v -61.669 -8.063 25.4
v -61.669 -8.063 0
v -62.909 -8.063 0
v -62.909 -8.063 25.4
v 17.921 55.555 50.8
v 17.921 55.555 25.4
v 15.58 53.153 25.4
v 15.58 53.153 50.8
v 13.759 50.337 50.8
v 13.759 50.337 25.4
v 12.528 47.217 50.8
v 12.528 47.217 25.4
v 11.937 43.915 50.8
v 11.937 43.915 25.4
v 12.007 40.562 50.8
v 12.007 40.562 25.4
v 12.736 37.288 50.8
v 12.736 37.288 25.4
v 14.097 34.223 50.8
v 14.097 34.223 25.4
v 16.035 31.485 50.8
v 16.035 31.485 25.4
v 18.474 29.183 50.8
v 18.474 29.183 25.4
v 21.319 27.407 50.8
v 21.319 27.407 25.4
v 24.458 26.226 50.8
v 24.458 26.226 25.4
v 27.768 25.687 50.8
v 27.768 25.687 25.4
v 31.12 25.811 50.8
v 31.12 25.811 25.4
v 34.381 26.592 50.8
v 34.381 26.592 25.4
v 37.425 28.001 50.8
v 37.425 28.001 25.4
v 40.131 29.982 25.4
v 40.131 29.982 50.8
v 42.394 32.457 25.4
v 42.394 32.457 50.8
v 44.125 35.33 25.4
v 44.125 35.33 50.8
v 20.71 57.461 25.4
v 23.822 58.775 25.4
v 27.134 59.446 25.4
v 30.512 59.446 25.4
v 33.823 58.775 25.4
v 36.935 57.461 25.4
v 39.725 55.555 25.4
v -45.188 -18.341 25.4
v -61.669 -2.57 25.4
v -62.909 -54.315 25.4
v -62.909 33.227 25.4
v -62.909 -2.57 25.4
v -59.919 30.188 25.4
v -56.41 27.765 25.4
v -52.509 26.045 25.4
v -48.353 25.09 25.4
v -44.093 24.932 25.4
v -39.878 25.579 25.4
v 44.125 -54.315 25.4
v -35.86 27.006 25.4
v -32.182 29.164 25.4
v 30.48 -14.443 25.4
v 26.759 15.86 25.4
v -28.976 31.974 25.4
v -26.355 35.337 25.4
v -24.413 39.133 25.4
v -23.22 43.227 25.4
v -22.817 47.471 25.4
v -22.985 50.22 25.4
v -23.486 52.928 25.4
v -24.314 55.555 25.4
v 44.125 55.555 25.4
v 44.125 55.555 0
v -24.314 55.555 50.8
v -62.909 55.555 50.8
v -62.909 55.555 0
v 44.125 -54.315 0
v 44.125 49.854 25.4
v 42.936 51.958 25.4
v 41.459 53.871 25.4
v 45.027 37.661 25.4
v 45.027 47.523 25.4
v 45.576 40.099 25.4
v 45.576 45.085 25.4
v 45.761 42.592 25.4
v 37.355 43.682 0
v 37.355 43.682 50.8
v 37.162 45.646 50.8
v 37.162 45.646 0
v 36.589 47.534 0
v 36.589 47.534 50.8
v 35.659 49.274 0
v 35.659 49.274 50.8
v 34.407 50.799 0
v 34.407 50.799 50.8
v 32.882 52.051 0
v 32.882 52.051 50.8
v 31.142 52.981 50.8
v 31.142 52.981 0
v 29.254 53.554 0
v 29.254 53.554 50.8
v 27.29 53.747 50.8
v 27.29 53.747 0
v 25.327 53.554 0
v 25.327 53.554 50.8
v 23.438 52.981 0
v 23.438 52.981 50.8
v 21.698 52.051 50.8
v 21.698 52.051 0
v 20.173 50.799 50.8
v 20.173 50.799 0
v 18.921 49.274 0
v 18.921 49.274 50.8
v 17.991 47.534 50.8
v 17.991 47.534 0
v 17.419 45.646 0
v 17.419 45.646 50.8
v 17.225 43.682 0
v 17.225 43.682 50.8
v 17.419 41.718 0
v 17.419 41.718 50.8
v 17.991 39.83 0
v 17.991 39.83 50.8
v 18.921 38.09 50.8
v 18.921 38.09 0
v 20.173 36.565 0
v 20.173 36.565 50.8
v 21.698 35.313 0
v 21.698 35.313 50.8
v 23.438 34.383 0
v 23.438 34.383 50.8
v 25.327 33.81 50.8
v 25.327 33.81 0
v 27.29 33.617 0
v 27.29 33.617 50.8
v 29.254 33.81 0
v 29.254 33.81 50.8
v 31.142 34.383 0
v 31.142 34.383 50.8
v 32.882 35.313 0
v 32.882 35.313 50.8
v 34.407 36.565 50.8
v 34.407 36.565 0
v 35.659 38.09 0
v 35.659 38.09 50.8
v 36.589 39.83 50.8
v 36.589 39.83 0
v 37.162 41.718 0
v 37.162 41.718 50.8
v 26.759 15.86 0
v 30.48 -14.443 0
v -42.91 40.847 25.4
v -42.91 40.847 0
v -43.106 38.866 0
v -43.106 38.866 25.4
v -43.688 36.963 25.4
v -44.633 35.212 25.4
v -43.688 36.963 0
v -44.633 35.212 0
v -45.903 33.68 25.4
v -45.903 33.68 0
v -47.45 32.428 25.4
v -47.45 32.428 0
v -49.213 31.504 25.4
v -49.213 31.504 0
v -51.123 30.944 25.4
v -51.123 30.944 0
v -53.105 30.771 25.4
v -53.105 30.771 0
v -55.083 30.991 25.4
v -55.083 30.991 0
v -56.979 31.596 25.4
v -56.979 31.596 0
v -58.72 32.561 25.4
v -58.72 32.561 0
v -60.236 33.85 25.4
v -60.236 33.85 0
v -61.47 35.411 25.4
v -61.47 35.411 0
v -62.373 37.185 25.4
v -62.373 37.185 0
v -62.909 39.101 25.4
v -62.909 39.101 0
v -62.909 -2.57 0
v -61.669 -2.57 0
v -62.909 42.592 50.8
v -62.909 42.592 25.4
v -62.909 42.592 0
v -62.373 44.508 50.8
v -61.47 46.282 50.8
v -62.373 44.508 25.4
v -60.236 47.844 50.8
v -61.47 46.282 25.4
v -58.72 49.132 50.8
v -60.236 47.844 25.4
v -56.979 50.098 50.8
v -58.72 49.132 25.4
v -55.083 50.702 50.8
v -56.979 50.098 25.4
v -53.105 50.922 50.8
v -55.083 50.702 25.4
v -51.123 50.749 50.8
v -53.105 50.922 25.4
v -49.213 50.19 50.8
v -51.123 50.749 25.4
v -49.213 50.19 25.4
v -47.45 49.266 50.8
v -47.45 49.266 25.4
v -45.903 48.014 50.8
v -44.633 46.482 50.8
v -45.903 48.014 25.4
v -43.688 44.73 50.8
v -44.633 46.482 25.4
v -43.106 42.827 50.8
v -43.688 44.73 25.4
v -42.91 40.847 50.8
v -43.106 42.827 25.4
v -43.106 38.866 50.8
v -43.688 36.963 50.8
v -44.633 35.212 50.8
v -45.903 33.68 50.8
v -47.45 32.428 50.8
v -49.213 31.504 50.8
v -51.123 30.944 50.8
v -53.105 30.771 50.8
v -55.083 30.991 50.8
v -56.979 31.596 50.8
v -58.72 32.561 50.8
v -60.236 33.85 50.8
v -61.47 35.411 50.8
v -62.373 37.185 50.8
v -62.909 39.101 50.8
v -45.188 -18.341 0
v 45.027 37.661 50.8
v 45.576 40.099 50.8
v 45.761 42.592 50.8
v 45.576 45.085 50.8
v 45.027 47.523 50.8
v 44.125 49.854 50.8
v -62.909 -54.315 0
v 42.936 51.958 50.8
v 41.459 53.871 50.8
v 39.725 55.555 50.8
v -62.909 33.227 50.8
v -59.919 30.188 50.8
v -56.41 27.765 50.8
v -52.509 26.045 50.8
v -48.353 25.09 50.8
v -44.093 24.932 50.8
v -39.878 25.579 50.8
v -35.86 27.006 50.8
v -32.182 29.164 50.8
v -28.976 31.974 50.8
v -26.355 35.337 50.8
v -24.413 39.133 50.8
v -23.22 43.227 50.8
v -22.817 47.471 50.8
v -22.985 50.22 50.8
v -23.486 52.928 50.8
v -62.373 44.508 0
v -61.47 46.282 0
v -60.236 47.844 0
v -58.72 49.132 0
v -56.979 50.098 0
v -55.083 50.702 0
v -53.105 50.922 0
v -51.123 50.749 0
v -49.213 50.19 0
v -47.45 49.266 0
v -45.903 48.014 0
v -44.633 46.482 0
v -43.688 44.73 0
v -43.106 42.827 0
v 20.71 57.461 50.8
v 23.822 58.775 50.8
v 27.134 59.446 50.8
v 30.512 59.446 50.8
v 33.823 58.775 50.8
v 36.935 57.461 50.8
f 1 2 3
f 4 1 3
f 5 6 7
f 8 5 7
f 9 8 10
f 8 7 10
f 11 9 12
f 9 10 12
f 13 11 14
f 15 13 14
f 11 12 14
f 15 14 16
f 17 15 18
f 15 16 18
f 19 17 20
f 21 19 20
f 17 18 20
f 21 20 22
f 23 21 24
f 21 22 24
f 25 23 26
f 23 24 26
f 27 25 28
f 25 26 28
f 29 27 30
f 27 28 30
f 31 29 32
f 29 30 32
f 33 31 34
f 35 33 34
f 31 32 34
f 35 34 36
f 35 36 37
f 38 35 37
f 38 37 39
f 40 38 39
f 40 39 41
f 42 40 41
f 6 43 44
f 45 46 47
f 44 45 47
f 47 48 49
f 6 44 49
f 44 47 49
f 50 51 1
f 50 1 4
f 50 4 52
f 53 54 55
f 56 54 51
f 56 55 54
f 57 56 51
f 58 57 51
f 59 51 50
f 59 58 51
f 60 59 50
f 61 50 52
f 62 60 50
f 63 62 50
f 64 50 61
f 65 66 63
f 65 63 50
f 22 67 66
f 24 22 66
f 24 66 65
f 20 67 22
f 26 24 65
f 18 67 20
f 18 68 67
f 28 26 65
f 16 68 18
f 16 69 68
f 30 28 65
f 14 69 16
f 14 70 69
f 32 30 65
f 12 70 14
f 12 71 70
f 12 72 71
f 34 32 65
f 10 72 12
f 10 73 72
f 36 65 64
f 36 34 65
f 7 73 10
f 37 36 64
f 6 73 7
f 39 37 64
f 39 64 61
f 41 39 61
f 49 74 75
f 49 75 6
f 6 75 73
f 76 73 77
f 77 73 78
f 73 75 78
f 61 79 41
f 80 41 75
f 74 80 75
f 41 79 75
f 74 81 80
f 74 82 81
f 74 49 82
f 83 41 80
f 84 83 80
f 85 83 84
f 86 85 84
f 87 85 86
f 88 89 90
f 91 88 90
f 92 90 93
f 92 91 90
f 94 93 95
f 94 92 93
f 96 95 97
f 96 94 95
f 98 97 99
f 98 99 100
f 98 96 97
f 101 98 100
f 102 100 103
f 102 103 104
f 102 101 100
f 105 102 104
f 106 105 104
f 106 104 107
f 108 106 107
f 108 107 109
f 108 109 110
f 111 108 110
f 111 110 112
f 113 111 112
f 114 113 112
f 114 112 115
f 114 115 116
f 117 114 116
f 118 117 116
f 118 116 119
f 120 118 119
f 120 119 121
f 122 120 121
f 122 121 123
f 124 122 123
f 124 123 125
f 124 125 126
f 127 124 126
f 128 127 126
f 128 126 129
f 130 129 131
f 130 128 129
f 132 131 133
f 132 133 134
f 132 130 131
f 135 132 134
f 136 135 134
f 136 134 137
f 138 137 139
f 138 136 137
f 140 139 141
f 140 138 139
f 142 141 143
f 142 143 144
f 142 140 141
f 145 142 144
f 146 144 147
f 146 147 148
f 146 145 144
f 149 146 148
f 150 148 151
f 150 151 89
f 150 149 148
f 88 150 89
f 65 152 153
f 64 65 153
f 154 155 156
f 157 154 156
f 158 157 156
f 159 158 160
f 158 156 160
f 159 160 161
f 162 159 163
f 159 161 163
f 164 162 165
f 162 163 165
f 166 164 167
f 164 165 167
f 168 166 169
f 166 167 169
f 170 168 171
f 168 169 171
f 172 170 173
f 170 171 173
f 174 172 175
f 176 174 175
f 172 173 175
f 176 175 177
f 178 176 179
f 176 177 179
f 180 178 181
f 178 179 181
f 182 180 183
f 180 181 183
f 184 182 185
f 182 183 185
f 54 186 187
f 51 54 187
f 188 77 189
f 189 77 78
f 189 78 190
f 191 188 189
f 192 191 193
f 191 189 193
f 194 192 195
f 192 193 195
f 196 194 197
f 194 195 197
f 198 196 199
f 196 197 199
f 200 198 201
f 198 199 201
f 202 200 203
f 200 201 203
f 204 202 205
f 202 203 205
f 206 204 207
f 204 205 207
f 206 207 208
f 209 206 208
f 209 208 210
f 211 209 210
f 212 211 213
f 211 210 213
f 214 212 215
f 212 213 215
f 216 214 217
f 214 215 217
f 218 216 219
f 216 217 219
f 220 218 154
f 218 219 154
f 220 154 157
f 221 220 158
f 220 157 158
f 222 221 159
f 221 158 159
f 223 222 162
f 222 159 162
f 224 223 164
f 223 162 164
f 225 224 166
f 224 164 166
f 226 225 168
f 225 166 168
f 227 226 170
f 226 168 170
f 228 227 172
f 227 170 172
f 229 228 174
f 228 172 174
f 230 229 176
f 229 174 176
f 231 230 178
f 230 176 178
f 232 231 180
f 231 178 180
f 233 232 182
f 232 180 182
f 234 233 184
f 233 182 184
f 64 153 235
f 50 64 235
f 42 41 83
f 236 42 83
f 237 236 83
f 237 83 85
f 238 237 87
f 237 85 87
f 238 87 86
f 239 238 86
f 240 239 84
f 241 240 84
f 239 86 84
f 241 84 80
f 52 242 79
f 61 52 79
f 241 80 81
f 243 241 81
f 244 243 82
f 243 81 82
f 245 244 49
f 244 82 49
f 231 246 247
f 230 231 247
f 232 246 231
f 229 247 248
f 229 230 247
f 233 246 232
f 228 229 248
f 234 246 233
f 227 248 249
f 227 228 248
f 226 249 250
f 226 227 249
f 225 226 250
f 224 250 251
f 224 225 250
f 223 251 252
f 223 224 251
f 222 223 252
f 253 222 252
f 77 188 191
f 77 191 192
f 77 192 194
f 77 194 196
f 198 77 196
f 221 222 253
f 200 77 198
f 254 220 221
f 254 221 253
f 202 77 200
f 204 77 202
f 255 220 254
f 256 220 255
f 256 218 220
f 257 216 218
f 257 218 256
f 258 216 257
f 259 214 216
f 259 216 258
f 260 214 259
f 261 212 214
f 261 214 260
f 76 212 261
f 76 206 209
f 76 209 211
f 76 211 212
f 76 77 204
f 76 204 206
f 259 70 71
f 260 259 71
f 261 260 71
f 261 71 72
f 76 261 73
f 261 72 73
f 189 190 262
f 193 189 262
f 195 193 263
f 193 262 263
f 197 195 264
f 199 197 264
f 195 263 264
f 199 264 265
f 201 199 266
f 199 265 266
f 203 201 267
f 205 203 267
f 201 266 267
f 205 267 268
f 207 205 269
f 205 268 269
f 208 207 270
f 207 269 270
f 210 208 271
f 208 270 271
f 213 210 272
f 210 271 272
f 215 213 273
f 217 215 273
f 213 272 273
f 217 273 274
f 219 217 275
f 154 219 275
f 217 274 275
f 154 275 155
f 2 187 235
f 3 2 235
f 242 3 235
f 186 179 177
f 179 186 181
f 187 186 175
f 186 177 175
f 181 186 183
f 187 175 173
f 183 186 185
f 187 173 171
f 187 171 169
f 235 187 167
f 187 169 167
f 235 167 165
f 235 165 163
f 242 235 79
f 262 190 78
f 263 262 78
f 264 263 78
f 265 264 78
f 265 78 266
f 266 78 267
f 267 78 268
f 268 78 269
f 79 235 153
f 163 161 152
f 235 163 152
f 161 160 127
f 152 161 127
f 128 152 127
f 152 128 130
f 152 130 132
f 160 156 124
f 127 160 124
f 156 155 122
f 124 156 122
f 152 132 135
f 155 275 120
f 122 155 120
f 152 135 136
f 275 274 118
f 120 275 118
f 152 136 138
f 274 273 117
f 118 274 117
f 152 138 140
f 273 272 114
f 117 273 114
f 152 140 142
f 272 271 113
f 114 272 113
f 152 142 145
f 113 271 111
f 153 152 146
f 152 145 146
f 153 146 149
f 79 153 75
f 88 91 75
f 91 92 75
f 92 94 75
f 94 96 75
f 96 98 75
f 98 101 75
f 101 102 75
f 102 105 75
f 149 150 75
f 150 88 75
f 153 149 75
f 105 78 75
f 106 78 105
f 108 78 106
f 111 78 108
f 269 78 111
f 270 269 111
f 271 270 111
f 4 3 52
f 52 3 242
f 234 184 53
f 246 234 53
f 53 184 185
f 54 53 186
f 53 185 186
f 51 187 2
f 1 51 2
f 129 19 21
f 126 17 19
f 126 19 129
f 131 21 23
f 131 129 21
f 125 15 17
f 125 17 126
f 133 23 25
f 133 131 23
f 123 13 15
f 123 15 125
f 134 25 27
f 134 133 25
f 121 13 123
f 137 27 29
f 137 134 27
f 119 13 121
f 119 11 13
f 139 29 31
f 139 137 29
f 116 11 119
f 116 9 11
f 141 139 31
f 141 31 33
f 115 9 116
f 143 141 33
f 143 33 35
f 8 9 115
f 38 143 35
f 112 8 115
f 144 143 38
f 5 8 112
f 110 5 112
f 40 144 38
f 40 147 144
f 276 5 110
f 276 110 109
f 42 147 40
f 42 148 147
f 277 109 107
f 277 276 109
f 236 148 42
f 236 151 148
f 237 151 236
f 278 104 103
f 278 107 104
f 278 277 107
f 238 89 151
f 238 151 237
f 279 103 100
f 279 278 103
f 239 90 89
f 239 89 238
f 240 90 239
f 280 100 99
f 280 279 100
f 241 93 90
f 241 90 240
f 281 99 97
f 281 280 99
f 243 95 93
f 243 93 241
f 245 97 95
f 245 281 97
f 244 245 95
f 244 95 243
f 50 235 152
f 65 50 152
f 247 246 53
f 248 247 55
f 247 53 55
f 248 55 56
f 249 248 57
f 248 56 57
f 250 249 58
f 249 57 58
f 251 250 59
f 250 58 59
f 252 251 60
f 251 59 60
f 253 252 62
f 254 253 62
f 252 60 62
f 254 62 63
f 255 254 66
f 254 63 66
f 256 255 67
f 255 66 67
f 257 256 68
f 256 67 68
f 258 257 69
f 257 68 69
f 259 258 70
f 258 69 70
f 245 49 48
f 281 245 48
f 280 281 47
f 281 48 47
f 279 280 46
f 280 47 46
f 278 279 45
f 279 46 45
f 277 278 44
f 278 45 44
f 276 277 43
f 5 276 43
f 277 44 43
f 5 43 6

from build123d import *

# Parameters (mm, degrees)
F0_R     = 10.0651181203
F1_DEPTH = 25.4
F2_R     = 10.0651181203
F3_DEPTH = 25.4


with BuildPart() as f1:
    # F0 (on Top) → F1 (new body)
    with BuildSketch(Plane.XY):
        with BuildLine():
            Line((44.1251173615, 55.5551163852), (-62.9092976451, 55.5551163852))
            Line((-62.9092976451, 55.5551163852), (-62.9092976451, 42.5920749035))
            ThreePointArc((-62.9092976451, 42.5920749035), (-52.109599733, 50.8846190086), (-42.9095561607, 40.8467426896))
            ThreePointArc((-42.9095561607, 40.8467426896), (-52.109599733, 30.8088663707), (-62.9092976451, 39.1014104757))
            Line((-62.9092976451, 39.1014104757), (-62.9092976451, -2.5695350487))
            Line((-62.9092976451, -2.5695350487), (-61.6688355803, -2.5695350487))
            Line((-61.6688355803, -2.5695350487), (-61.6688355803, -8.0630239099))
            Line((-61.6688355803, -8.0630239099), (-62.9092976451, -8.0630239099))
            Line((-62.9092976451, -8.0630239099), (-62.9092976451, -54.3146505952))
            Line((-62.9092976451, -54.3146505952), (-55.1120936871, -54.3146505952))
            Line((-55.1120936871, -54.3146505952), (34.910235554, -54.3146505952))
            Line((34.910235554, -54.3146505952), (44.1251173615, -54.3146505952))
            Line((44.1251173615, -54.3146505952), (44.1251173615, 20.8220928907))
            Line((44.1251173615, 20.8220928907), (44.1251173615, 28.4420922399))
            Line((44.1251173615, 28.4420922399), (44.1251173615, 55.5551163852))
        make_face()
        Polygon((30.4799973965, -14.4425584003), (-45.1883710921, -18.3411631733), (26.7586056143, 15.8602334559), align=None, mode=Mode.SUBTRACT)
        with Locations((27.2902306169, 43.6820946634)):
            Circle(F0_R, mode=Mode.SUBTRACT)
    extrude(amount=F1_DEPTH)

    # F2 (on face) → F3 (join)
    with BuildSketch(Plane.XY.offset(25.4)):
        with BuildLine():
            ThreePointArc((-62.9092976451, 33.2274518748), (-37.8353474986, 26.1976296864), (-22.8169896281, 47.4713294781))
            ThreePointArc((-22.8169896281, 47.4713294781), (-23.1943629489, 51.5819332274), (-24.3138670359, 55.5551163852))
            Line((-24.3138670359, 55.5551163852), (-62.9092976451, 55.5551163852))
            Line((-62.9092976451, 55.5551163852), (-62.9092976451, 42.5920749035))
            ThreePointArc((-62.9092976451, 42.5920749035), (-42.9095561607, 40.8467426896), (-62.9092976451, 39.1014104757))
            Line((-62.9092976451, 39.1014104757), (-62.9092976451, 33.2274518748))
        make_face()
        with BuildLine():
            Line((39.7248882397, 55.5551163852), (17.9206636207, 55.5551163852))
            ThreePointArc((17.9206636207, 55.5551163852), (18.4737505401, 29.1833400362), (44.1251173615, 35.3301988385))
            Line((44.1251173615, 35.3301988385), (44.1251173615, 49.8539509685))
            ThreePointArc((44.1251173615, 49.8539509685), (42.2315107975, 52.9411002936), (39.7248882397, 55.5551163852))
        make_face()
        with Locations((27.2902306169, 43.6820946634)):
            Circle(F2_R, mode=Mode.SUBTRACT)
        with BuildLine():
            ThreePointArc((39.7248882397, 55.5551163852), (28.8227759302, 59.5300941875), (17.9206636207, 55.5551163852))
            Line((17.9206636207, 55.5551163852), (39.7248882397, 55.5551163852))
        make_face()
        with BuildLine():
            Line((44.1251173615, 49.8539509685), (44.1251173615, 35.3301988385))
            ThreePointArc((44.1251173615, 35.3301988385), (45.3468167725, 38.8701706187), (45.7607952142, 42.5920749035))
            ThreePointArc((45.7607952142, 42.5920749035), (45.3468167725, 46.3139791883), (44.1251173615, 49.8539509685))
        make_face()
    extrude(amount=F3_DEPTH)


solid = f1.part
